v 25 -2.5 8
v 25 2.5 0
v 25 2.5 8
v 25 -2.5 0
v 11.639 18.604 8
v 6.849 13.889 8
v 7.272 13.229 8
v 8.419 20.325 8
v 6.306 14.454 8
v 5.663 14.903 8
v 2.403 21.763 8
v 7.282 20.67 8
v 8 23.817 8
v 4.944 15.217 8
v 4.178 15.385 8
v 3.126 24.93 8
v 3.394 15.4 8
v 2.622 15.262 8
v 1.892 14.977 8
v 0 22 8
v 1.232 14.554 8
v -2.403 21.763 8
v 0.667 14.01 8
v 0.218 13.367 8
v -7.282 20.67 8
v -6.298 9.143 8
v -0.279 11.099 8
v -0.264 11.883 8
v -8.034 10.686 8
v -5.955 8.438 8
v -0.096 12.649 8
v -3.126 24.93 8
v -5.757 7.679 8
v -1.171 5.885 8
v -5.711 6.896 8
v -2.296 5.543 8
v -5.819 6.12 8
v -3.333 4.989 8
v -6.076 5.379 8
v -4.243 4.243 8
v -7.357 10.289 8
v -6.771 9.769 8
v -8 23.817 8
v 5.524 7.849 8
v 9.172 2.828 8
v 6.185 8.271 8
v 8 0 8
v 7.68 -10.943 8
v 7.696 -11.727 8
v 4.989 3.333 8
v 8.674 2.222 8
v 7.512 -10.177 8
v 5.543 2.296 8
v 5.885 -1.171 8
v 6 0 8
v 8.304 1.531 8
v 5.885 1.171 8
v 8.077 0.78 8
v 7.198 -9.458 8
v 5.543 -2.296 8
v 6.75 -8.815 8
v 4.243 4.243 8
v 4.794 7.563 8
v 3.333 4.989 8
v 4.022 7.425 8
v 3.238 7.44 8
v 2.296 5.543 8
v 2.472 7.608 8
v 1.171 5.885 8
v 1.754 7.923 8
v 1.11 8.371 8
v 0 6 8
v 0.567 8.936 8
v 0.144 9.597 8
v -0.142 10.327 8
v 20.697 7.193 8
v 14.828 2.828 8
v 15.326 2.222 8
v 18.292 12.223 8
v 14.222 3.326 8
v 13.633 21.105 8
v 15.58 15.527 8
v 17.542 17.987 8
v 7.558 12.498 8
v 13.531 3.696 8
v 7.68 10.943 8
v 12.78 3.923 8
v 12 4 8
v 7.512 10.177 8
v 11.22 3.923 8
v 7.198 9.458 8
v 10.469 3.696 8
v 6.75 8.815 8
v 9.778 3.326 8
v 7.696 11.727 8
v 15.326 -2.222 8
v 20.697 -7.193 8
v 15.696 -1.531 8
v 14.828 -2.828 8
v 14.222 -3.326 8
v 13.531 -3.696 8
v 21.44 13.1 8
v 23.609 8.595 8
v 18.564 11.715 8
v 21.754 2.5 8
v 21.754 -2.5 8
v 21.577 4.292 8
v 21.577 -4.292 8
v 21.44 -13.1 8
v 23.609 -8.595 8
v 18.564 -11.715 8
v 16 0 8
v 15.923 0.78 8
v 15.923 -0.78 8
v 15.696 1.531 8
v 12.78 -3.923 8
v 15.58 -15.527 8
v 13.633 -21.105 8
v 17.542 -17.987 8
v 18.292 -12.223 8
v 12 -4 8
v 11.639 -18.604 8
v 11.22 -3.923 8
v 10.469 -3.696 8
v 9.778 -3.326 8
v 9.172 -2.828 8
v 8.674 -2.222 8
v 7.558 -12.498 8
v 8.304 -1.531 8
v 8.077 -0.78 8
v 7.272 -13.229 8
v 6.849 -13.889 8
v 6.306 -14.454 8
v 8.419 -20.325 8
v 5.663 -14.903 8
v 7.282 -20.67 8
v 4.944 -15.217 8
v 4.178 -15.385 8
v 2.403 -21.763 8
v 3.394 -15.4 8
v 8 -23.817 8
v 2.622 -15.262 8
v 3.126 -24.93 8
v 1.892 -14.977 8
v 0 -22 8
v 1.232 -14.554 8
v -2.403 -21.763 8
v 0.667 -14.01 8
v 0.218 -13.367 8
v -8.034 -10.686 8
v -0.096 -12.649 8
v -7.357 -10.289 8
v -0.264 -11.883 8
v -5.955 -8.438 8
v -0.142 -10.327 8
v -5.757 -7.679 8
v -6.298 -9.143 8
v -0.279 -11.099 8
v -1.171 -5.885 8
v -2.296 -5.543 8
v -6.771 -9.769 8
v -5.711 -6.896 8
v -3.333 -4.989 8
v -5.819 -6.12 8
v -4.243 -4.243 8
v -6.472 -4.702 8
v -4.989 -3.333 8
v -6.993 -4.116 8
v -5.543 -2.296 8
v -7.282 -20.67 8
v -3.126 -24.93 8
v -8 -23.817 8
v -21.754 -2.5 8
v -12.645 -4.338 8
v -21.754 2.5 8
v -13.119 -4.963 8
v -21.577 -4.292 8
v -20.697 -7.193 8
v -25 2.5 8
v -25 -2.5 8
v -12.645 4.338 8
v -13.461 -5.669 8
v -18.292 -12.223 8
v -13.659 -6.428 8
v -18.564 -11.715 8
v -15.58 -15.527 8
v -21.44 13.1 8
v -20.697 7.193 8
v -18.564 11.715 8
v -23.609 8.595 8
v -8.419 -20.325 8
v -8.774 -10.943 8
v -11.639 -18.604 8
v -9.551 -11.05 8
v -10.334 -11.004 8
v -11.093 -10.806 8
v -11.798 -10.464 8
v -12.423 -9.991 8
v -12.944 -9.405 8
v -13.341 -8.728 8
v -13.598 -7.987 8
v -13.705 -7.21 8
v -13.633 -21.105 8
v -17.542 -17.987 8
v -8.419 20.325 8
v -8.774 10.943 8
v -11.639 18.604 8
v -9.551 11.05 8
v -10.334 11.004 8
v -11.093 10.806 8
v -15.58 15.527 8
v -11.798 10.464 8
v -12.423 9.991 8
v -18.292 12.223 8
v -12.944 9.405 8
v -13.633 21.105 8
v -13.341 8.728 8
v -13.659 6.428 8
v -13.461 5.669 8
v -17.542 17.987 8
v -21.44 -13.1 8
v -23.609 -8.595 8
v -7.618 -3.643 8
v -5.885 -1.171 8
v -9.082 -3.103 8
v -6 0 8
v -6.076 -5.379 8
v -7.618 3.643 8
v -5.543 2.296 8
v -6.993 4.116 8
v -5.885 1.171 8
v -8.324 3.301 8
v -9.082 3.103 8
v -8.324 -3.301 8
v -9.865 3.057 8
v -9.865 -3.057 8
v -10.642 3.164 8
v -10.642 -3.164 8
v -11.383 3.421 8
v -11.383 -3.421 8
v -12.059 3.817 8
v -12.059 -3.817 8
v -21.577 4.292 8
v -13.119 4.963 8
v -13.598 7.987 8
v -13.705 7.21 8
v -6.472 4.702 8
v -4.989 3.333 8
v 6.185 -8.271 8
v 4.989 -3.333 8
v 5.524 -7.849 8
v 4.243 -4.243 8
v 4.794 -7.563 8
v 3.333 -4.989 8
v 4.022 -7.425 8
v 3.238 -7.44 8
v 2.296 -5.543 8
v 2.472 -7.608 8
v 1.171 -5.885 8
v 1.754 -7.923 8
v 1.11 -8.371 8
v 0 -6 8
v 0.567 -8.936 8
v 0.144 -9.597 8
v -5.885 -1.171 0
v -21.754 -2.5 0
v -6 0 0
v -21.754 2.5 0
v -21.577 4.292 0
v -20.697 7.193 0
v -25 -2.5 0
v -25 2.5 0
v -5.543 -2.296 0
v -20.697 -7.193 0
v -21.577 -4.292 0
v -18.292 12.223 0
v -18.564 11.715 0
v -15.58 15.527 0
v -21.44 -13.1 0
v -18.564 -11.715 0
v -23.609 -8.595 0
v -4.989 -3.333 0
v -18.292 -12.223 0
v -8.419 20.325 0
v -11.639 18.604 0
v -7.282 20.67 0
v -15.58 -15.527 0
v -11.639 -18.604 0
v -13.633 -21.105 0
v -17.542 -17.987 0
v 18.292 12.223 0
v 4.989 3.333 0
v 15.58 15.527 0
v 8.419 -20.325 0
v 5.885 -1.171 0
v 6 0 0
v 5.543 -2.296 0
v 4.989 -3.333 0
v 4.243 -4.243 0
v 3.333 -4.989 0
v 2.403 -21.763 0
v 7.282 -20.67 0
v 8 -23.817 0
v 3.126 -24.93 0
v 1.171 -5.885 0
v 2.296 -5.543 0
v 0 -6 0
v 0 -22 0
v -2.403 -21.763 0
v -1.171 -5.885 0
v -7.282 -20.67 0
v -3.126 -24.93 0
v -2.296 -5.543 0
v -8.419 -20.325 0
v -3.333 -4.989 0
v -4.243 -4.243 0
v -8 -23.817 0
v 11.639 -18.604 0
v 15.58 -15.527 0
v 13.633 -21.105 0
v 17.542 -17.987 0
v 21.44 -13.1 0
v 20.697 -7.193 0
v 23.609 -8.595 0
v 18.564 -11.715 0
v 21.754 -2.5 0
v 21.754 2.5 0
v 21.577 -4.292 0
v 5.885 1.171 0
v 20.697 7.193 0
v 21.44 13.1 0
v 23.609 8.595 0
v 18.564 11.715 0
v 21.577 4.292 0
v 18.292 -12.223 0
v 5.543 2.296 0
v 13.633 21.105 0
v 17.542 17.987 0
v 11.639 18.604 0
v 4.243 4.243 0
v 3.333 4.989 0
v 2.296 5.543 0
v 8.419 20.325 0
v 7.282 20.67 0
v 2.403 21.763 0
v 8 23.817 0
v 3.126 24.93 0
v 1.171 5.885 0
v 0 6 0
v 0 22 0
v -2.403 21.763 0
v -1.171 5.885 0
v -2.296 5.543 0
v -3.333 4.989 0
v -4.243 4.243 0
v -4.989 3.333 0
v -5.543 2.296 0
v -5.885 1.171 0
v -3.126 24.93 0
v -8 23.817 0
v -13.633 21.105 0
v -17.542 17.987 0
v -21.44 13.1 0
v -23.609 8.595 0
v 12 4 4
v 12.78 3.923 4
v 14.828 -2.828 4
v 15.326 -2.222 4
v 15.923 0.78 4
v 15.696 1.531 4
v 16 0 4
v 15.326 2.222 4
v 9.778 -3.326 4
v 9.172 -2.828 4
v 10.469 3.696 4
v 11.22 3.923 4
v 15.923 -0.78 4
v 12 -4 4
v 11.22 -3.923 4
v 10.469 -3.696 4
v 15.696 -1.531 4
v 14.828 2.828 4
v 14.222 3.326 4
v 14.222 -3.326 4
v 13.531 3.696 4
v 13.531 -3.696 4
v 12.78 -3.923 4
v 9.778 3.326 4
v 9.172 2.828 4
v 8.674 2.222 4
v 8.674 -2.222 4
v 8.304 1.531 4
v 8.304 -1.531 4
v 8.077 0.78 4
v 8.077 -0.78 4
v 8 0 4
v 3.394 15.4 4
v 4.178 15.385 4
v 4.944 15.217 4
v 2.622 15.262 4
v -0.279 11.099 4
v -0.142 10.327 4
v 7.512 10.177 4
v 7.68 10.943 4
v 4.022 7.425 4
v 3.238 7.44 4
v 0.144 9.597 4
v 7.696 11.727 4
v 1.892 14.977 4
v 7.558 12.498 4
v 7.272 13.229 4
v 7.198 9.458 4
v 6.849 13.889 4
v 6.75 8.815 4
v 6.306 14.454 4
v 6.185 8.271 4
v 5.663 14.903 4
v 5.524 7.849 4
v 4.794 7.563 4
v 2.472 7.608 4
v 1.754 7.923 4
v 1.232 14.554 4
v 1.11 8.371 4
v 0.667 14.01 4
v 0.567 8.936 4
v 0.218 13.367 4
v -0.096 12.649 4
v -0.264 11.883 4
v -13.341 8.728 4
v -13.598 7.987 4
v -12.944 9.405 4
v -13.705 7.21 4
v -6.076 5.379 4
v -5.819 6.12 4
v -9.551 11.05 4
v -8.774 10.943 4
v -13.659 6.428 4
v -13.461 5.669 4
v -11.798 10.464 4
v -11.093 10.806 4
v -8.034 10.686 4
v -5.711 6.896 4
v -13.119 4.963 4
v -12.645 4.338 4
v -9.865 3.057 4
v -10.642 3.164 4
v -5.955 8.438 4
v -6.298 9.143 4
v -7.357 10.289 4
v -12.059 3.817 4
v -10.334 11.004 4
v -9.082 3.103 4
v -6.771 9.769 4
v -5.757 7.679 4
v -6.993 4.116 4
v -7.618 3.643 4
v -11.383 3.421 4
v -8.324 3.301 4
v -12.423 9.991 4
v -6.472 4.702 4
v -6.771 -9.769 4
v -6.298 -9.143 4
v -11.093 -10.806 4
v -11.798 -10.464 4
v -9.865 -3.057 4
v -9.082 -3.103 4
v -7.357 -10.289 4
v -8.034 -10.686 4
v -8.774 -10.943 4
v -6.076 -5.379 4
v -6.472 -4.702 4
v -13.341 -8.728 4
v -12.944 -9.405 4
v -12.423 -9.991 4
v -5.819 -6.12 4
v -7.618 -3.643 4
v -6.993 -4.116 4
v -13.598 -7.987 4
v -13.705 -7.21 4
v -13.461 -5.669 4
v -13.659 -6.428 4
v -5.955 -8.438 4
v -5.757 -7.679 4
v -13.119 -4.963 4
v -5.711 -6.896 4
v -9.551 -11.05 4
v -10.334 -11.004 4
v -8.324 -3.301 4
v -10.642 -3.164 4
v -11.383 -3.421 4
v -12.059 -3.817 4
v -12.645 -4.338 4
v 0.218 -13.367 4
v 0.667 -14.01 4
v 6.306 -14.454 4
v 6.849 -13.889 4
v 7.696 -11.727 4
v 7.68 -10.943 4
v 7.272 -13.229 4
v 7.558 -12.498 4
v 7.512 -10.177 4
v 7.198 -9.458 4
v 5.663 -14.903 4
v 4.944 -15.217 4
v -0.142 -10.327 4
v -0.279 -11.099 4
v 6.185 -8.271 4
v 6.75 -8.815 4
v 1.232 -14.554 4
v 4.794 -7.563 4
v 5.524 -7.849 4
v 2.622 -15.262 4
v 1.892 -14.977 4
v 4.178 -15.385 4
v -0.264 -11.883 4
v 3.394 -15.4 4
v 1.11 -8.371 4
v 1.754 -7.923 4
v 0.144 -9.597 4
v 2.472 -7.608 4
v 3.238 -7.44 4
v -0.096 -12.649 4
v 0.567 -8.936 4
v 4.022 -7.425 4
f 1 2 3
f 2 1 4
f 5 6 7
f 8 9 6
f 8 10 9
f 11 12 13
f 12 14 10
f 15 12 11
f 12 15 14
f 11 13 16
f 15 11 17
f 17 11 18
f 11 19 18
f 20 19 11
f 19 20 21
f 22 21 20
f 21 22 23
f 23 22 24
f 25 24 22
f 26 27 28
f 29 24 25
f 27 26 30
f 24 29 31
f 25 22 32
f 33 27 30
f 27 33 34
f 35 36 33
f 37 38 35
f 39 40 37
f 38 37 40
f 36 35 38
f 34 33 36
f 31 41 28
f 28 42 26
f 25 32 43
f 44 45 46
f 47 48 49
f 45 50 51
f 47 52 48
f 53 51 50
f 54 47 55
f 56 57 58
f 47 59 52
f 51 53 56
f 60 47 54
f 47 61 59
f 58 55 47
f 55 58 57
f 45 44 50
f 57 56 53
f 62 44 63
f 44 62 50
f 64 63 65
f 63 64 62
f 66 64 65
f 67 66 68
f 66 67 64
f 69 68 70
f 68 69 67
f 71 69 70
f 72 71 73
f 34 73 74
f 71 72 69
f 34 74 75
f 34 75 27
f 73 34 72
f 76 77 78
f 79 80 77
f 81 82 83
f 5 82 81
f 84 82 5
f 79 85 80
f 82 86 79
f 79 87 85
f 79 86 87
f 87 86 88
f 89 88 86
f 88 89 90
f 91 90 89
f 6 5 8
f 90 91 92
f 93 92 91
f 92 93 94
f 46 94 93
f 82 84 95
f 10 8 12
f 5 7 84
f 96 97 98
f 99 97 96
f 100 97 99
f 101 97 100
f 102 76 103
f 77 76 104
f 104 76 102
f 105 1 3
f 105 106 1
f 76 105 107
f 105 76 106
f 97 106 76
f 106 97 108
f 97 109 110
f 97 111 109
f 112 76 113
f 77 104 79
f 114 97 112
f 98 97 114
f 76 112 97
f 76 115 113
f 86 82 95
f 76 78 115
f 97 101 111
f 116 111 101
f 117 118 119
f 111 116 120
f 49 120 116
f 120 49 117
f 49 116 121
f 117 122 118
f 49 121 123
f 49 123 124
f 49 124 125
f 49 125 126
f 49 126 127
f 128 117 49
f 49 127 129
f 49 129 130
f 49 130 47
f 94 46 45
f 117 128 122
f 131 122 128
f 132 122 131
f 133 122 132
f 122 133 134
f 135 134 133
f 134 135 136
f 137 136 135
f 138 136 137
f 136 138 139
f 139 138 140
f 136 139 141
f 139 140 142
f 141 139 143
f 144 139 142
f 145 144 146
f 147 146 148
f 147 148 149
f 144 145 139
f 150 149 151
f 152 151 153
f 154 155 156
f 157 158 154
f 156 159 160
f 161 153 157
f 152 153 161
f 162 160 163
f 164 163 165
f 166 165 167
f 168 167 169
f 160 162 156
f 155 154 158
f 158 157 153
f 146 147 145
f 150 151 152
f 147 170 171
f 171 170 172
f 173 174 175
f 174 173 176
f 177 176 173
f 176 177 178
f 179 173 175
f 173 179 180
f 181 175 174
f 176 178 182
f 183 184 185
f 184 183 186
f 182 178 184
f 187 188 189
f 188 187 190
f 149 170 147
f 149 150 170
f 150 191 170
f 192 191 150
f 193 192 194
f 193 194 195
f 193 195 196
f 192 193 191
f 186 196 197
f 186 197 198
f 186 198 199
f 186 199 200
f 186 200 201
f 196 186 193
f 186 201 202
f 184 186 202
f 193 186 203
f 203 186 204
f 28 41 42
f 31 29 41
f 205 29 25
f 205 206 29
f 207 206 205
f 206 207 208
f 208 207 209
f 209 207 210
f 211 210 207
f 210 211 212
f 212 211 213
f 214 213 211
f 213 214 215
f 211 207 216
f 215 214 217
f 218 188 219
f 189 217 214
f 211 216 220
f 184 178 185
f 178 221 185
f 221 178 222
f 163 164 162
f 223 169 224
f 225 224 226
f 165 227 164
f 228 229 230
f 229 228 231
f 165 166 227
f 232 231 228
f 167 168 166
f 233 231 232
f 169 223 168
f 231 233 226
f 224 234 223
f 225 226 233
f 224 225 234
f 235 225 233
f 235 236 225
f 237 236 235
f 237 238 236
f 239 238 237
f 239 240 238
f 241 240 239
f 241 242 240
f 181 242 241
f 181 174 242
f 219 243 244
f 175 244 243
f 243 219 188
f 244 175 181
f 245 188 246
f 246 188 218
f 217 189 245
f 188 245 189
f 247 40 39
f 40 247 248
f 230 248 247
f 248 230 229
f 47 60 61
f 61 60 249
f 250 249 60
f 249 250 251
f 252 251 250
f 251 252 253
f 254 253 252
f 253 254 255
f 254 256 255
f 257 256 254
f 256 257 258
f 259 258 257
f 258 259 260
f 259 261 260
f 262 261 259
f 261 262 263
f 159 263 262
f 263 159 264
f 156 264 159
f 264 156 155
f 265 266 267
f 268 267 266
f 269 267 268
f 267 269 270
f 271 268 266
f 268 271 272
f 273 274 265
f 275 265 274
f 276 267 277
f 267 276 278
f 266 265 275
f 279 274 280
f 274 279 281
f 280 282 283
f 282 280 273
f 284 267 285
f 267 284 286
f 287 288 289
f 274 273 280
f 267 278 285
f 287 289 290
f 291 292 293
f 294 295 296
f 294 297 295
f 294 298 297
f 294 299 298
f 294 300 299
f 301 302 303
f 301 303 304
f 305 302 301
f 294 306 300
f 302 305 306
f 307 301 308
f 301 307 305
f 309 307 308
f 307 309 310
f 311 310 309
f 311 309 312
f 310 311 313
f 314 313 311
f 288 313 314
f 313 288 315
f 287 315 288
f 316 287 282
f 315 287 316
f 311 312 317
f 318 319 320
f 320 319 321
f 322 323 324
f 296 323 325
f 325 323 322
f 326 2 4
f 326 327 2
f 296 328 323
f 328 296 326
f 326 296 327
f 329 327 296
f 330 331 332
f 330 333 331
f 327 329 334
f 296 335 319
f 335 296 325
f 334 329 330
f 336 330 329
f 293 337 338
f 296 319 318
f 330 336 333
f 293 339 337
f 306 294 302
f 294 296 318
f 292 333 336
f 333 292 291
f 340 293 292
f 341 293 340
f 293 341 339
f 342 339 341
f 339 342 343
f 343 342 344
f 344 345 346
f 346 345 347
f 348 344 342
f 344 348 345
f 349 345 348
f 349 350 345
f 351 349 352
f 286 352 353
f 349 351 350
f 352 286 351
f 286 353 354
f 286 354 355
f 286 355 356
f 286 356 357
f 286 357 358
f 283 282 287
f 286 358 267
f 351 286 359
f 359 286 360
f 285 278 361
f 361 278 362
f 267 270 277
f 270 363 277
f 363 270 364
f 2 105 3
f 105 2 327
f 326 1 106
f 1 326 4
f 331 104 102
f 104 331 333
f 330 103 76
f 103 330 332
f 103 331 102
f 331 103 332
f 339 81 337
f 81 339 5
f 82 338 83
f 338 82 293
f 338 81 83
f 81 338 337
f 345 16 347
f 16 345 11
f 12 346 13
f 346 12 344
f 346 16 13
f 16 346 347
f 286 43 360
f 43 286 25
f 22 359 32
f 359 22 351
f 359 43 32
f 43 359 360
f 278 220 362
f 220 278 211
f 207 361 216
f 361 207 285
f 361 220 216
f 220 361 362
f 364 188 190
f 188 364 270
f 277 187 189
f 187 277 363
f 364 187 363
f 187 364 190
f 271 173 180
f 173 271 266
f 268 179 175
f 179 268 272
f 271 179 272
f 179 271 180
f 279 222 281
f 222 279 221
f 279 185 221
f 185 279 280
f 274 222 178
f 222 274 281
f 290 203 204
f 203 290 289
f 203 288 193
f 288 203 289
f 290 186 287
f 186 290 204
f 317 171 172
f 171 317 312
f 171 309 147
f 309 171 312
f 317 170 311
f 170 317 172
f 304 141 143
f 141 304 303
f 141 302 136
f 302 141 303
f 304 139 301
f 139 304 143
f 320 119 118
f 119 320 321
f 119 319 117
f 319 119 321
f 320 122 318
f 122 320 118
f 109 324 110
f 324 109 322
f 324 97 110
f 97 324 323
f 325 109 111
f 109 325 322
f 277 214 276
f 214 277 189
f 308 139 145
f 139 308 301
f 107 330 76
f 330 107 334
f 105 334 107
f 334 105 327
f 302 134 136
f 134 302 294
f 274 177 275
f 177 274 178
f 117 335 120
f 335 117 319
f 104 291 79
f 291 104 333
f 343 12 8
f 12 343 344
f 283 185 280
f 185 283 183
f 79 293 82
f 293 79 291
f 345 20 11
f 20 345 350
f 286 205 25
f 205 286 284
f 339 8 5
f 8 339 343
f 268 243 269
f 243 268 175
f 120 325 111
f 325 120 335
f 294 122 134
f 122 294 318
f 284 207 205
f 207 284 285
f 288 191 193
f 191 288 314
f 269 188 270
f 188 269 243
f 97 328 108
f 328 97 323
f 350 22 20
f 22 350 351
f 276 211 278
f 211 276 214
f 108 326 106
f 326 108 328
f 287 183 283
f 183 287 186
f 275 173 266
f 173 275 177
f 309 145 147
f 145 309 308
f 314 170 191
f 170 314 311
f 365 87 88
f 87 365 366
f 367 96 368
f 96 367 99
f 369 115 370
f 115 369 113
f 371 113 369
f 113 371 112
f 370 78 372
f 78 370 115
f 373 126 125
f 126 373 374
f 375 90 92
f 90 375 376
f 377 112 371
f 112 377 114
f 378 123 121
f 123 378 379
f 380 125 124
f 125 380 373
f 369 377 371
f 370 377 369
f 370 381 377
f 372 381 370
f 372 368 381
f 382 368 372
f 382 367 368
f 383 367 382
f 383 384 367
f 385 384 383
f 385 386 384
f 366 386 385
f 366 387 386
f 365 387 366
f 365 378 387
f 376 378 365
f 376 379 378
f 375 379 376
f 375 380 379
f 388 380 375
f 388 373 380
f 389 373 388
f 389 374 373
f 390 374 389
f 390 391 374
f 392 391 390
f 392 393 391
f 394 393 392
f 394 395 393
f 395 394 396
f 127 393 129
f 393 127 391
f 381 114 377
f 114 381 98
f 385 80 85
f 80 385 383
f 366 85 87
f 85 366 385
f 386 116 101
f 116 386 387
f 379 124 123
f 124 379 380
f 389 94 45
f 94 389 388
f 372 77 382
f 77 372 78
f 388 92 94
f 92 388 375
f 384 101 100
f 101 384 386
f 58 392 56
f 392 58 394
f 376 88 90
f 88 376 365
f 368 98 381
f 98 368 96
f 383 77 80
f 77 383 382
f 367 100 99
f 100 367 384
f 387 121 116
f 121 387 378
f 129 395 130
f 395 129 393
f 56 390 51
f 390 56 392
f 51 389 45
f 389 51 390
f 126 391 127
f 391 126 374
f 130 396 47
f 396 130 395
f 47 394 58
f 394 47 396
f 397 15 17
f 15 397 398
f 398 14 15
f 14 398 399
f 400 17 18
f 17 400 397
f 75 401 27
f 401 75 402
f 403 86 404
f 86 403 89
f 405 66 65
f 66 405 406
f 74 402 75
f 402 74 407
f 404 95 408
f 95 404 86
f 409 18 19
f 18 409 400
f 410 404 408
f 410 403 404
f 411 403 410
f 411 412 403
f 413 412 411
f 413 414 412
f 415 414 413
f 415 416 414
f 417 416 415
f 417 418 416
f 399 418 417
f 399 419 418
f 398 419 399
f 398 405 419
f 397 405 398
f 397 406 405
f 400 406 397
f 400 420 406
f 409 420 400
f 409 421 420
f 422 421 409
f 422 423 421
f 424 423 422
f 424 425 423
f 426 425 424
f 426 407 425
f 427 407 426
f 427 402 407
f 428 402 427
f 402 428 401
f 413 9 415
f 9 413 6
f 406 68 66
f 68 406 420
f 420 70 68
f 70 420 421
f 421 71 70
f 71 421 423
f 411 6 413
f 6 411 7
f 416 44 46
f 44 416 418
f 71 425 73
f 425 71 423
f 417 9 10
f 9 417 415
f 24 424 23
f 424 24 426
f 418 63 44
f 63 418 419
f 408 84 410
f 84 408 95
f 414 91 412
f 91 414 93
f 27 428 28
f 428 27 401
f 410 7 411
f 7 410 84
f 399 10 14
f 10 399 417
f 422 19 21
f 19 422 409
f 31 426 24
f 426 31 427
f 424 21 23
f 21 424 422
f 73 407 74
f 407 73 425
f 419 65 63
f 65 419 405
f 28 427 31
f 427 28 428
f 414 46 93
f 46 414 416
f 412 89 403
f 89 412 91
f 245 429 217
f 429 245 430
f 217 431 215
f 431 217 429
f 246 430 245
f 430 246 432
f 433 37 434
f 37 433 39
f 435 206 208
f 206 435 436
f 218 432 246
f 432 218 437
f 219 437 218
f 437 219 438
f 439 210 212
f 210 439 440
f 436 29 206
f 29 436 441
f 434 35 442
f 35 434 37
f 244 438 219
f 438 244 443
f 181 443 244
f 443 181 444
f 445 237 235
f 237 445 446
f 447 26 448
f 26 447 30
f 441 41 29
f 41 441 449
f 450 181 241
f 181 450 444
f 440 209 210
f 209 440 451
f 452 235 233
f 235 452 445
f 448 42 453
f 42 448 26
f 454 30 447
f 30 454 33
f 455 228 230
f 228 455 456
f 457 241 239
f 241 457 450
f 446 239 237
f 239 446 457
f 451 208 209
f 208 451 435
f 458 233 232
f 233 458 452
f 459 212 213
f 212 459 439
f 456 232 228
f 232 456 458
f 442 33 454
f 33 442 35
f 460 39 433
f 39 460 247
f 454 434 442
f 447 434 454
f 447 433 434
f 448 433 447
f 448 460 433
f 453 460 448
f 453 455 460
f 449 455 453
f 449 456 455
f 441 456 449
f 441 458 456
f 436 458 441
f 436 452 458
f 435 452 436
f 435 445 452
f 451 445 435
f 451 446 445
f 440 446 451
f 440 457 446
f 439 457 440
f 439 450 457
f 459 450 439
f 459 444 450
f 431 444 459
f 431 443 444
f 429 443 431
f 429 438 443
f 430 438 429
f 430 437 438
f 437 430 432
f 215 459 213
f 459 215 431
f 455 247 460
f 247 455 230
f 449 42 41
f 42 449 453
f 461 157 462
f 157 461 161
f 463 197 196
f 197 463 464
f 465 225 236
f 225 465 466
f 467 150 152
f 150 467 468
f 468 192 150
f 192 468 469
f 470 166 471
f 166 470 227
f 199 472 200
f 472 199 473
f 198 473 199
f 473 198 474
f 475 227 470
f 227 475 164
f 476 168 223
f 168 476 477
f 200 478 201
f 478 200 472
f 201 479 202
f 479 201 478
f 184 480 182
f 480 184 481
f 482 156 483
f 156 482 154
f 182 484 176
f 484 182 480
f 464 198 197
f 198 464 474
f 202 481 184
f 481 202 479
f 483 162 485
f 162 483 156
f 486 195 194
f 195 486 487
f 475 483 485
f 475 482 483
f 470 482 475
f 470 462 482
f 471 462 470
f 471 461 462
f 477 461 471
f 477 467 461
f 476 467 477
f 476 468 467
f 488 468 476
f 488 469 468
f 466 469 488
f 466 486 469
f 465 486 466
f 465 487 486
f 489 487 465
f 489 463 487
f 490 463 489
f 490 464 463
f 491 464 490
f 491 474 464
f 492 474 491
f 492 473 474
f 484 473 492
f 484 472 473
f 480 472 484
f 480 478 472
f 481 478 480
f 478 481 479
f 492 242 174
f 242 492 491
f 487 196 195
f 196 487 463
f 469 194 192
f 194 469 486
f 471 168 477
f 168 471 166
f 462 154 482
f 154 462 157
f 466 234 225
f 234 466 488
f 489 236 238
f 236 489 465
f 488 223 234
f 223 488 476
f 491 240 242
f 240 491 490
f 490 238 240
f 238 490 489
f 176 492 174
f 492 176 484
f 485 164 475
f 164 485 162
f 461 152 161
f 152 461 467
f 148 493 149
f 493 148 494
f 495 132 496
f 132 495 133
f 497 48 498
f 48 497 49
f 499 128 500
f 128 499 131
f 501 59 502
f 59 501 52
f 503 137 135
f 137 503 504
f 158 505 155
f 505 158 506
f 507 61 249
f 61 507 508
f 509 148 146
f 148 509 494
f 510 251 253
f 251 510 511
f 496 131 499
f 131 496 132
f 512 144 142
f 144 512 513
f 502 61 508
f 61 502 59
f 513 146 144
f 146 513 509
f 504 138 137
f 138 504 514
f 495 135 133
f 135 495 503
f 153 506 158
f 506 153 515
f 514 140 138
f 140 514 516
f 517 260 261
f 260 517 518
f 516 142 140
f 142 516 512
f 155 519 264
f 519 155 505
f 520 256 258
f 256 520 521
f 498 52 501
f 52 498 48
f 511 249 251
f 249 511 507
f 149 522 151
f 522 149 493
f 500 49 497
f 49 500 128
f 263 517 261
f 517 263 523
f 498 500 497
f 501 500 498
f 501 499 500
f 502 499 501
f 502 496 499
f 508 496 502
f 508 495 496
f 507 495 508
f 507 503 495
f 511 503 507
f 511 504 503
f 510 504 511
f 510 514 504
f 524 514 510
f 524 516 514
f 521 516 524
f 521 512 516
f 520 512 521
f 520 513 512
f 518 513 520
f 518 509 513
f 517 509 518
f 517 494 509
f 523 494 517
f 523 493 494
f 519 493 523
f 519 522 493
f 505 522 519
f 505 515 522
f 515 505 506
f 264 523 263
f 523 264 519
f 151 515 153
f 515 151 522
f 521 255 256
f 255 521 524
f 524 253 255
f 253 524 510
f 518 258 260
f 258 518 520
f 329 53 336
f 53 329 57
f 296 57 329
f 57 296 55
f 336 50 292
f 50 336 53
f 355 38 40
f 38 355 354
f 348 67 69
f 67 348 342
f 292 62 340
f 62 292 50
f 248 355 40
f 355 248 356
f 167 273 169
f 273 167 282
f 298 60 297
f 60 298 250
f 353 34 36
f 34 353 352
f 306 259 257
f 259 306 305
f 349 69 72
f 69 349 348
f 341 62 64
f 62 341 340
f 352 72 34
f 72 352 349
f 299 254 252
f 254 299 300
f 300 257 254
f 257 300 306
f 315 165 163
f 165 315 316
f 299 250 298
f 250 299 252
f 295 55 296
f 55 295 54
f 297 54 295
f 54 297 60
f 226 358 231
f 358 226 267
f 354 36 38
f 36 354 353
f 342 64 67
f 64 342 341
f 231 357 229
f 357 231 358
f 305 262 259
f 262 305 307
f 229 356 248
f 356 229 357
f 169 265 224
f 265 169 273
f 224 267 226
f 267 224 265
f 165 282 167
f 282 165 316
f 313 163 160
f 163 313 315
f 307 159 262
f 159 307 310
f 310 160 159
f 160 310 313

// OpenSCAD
$fn = 32;

// ----------------------------------------------------------------------
// Spur blank: lightened gear blank
// ----------------------------------------------------------------------

// --- parameters (mm) ---
disc_r = 22;              // blank root radius
disc_t = 8;               // blank thickness
n_teeth = 14;             // stub tooth count
tooth_w = 5;              // tooth width at the root
tooth_h = 3;              // tooth height above the root
bore_r = 6;               // central bore radius
ring_r = 12;              // lightening pocket ring radius
pocket_r = 4;             // lightening pocket radius
fit_tol = 0.05;           // tolerance for press fits, mm
free_tol = 0.2;           // tolerance for clearance fits, mm

out_r = disc_r + tooth_h;  // tip radius
bbox_x = 50.0;  // measured width over the teeth
bbox_y = 49.86;  // measured depth over the teeth

difference() {
union() {
  cylinder(r = disc_r, h = disc_t);
  for (i = [0 : n_teeth - 1])
    rotate([0, 0, i * 360 / n_teeth])
      translate([disc_r - 1, -tooth_w / 2, 0])
        cube([tooth_h + 1, tooth_w, disc_t]);
}
  translate([0, 0, -1]) cylinder(r = bore_r, h = disc_t + 2);
  for (i = [0 : 5])
    rotate([0, 0, i * 72])
      translate([ring_r, 0, disc_t - 4])
        cylinder(r = pocket_r, h = 5);
}
